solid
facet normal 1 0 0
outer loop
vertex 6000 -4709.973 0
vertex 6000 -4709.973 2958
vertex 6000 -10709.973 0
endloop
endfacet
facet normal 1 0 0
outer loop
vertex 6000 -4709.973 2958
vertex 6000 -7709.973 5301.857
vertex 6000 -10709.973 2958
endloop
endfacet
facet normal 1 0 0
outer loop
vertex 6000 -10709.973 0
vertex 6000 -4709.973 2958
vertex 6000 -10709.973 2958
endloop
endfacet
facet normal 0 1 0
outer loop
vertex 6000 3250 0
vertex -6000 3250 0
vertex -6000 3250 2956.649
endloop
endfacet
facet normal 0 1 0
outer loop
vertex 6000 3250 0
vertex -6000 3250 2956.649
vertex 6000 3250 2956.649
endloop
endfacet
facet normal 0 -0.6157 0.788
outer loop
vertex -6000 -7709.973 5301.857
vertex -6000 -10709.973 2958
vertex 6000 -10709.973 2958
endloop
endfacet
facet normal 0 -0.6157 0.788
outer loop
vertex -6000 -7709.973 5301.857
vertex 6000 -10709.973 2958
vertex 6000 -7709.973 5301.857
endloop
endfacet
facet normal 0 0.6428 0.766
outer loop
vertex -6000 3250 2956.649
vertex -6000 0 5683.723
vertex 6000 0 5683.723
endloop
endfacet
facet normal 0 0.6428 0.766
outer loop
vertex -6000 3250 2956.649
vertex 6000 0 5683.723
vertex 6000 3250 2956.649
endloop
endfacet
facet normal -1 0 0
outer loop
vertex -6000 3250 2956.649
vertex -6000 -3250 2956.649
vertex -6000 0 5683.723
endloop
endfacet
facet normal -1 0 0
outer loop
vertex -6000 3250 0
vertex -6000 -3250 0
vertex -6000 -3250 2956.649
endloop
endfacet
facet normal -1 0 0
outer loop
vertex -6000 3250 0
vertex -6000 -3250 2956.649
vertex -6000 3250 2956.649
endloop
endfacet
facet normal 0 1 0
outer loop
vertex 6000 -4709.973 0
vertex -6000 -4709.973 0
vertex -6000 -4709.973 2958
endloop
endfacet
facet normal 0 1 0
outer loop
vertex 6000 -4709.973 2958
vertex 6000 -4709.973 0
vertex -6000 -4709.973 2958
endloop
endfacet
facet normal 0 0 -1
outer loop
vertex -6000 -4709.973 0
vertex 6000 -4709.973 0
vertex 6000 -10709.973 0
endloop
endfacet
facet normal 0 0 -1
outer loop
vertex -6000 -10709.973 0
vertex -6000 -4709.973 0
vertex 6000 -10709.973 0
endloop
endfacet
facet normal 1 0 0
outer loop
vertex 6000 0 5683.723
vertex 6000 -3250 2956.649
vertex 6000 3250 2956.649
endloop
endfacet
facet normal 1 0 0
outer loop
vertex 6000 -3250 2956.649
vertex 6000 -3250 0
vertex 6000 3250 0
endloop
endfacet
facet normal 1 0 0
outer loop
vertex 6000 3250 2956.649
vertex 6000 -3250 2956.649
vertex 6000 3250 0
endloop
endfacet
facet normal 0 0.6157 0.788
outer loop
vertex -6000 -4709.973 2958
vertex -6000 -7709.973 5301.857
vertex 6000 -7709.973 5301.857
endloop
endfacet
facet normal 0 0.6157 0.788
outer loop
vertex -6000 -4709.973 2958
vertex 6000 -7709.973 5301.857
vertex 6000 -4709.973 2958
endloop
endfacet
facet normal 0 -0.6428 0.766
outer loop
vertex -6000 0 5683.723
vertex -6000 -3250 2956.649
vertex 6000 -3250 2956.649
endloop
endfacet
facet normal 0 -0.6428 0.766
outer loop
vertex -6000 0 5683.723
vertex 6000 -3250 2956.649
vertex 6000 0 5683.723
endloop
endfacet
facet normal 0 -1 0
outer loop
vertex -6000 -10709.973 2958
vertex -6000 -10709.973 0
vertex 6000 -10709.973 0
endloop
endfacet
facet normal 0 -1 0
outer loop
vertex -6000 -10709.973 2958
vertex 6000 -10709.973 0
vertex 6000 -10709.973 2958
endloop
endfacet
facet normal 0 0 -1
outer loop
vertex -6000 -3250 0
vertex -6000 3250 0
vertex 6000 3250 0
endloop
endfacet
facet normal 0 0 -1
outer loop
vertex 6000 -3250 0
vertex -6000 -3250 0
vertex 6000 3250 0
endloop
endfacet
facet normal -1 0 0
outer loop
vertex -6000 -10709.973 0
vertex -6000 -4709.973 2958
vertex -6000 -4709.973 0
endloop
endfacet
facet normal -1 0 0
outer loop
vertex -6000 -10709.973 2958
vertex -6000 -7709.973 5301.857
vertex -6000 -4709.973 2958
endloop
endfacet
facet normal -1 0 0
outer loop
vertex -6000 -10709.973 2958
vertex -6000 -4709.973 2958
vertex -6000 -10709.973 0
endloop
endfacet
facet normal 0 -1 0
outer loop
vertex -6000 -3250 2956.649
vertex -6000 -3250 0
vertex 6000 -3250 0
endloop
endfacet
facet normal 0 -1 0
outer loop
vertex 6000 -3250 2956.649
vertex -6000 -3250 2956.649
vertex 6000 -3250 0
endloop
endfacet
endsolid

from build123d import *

# Parameters (mm, degrees)
F0_W     = 12000
F0_H     = 6500
F1_DEPTH = 2800
F3_DEPTH = 12000
F2_W     = 6000
F2_H     = 2958


# Not quite as in the source:
# - a feature names something its author has since deleted; it is built from what else it names


with BuildPart() as f1:
    # F0 (on Top) → F1 (new body)
    with BuildSketch(Plane.XY):
        Rectangle(F0_W, F0_H)
    extrude(amount=F1_DEPTH)

    # F2 (on face) → F3 (join)
    with BuildSketch(Plane(origin=(-6000, 0, 0), x_dir=(0, -1, 0), z_dir=(-1, 0, 0))):
        Polygon((-2254.2731399598, 3270), (-2814.3973284791, 2800), (-2254.2731399598, 2800), align=None)
        Polygon((-3250, 2956.6488747199), (-3250, 2800), (0, 5527.0738013262), (3250, 2800), (3250, 2956.6488747199), (3173.8782442282, 3020.5226119126), (0, 5683.722676046), (-3178.3420854061, 3016.7770044265), align=None)
        Polygon((2254.2731399598, 3270), (2254.2731399598, 2800), (2814.3973284791, 2800), align=None)
        Polygon((-2814.3973284791, 2800), (-3250, 2800), (-3250, 2570), (-2254.2731399598, 2570), (-2254.2731399598, 2800), align=None)
        Polygon((3250, 2570), (3250, 2800), (2814.3973284791, 2800), (2254.2731399598, 2800), (2254.2731399598, 2570), align=None)
        Polygon((-2254.2731399598, 2570), (-3250, 2570), (-3250, 2400), (3250, 2400), (3250, 2570), (2254.2731399598, 2570), align=None)
        Polygon((0, 5527.0738013262), (-3250, 2800), (-2814.3973284791, 2800), (-2254.2731399598, 3270), (-650, 4616.1450000479), (0, 5161.5597603131), (650, 4616.1450000479), (2254.2731399598, 3270), (2814.3973284791, 2800), (3250, 2800), align=None)
        Polygon((0, 5161.5597603131), (-650, 4616.1450000479), (650, 4616.1450000479), align=None)
        Polygon((-2254.2731399598, 3270), (-2254.2731399598, 2800), (2254.2731399598, 2800), (2254.2731399598, 3270), (650, 4616.1450000479), (-650, 4616.1450000479), align=None)
    extrude(amount=-F3_DEPTH)


with BuildPart() as f3:
    # F2 (on face) → F3, piece 2 (new body)
    with BuildSketch(Plane(origin=(-6000, 0, 0), x_dir=(0, -1, 0), z_dir=(-1, 0, 0))):
        Polygon((7709.972858429, 5301.8568795202), (4709.972858429, 2958), (10709.972858429, 2958), align=None)
        with Locations((7709.972858429, 1479)):
            Rectangle(F2_W, F2_H)
    extrude(amount=-F3_DEPTH)


solid = Compound([f1.part, f3.part])
